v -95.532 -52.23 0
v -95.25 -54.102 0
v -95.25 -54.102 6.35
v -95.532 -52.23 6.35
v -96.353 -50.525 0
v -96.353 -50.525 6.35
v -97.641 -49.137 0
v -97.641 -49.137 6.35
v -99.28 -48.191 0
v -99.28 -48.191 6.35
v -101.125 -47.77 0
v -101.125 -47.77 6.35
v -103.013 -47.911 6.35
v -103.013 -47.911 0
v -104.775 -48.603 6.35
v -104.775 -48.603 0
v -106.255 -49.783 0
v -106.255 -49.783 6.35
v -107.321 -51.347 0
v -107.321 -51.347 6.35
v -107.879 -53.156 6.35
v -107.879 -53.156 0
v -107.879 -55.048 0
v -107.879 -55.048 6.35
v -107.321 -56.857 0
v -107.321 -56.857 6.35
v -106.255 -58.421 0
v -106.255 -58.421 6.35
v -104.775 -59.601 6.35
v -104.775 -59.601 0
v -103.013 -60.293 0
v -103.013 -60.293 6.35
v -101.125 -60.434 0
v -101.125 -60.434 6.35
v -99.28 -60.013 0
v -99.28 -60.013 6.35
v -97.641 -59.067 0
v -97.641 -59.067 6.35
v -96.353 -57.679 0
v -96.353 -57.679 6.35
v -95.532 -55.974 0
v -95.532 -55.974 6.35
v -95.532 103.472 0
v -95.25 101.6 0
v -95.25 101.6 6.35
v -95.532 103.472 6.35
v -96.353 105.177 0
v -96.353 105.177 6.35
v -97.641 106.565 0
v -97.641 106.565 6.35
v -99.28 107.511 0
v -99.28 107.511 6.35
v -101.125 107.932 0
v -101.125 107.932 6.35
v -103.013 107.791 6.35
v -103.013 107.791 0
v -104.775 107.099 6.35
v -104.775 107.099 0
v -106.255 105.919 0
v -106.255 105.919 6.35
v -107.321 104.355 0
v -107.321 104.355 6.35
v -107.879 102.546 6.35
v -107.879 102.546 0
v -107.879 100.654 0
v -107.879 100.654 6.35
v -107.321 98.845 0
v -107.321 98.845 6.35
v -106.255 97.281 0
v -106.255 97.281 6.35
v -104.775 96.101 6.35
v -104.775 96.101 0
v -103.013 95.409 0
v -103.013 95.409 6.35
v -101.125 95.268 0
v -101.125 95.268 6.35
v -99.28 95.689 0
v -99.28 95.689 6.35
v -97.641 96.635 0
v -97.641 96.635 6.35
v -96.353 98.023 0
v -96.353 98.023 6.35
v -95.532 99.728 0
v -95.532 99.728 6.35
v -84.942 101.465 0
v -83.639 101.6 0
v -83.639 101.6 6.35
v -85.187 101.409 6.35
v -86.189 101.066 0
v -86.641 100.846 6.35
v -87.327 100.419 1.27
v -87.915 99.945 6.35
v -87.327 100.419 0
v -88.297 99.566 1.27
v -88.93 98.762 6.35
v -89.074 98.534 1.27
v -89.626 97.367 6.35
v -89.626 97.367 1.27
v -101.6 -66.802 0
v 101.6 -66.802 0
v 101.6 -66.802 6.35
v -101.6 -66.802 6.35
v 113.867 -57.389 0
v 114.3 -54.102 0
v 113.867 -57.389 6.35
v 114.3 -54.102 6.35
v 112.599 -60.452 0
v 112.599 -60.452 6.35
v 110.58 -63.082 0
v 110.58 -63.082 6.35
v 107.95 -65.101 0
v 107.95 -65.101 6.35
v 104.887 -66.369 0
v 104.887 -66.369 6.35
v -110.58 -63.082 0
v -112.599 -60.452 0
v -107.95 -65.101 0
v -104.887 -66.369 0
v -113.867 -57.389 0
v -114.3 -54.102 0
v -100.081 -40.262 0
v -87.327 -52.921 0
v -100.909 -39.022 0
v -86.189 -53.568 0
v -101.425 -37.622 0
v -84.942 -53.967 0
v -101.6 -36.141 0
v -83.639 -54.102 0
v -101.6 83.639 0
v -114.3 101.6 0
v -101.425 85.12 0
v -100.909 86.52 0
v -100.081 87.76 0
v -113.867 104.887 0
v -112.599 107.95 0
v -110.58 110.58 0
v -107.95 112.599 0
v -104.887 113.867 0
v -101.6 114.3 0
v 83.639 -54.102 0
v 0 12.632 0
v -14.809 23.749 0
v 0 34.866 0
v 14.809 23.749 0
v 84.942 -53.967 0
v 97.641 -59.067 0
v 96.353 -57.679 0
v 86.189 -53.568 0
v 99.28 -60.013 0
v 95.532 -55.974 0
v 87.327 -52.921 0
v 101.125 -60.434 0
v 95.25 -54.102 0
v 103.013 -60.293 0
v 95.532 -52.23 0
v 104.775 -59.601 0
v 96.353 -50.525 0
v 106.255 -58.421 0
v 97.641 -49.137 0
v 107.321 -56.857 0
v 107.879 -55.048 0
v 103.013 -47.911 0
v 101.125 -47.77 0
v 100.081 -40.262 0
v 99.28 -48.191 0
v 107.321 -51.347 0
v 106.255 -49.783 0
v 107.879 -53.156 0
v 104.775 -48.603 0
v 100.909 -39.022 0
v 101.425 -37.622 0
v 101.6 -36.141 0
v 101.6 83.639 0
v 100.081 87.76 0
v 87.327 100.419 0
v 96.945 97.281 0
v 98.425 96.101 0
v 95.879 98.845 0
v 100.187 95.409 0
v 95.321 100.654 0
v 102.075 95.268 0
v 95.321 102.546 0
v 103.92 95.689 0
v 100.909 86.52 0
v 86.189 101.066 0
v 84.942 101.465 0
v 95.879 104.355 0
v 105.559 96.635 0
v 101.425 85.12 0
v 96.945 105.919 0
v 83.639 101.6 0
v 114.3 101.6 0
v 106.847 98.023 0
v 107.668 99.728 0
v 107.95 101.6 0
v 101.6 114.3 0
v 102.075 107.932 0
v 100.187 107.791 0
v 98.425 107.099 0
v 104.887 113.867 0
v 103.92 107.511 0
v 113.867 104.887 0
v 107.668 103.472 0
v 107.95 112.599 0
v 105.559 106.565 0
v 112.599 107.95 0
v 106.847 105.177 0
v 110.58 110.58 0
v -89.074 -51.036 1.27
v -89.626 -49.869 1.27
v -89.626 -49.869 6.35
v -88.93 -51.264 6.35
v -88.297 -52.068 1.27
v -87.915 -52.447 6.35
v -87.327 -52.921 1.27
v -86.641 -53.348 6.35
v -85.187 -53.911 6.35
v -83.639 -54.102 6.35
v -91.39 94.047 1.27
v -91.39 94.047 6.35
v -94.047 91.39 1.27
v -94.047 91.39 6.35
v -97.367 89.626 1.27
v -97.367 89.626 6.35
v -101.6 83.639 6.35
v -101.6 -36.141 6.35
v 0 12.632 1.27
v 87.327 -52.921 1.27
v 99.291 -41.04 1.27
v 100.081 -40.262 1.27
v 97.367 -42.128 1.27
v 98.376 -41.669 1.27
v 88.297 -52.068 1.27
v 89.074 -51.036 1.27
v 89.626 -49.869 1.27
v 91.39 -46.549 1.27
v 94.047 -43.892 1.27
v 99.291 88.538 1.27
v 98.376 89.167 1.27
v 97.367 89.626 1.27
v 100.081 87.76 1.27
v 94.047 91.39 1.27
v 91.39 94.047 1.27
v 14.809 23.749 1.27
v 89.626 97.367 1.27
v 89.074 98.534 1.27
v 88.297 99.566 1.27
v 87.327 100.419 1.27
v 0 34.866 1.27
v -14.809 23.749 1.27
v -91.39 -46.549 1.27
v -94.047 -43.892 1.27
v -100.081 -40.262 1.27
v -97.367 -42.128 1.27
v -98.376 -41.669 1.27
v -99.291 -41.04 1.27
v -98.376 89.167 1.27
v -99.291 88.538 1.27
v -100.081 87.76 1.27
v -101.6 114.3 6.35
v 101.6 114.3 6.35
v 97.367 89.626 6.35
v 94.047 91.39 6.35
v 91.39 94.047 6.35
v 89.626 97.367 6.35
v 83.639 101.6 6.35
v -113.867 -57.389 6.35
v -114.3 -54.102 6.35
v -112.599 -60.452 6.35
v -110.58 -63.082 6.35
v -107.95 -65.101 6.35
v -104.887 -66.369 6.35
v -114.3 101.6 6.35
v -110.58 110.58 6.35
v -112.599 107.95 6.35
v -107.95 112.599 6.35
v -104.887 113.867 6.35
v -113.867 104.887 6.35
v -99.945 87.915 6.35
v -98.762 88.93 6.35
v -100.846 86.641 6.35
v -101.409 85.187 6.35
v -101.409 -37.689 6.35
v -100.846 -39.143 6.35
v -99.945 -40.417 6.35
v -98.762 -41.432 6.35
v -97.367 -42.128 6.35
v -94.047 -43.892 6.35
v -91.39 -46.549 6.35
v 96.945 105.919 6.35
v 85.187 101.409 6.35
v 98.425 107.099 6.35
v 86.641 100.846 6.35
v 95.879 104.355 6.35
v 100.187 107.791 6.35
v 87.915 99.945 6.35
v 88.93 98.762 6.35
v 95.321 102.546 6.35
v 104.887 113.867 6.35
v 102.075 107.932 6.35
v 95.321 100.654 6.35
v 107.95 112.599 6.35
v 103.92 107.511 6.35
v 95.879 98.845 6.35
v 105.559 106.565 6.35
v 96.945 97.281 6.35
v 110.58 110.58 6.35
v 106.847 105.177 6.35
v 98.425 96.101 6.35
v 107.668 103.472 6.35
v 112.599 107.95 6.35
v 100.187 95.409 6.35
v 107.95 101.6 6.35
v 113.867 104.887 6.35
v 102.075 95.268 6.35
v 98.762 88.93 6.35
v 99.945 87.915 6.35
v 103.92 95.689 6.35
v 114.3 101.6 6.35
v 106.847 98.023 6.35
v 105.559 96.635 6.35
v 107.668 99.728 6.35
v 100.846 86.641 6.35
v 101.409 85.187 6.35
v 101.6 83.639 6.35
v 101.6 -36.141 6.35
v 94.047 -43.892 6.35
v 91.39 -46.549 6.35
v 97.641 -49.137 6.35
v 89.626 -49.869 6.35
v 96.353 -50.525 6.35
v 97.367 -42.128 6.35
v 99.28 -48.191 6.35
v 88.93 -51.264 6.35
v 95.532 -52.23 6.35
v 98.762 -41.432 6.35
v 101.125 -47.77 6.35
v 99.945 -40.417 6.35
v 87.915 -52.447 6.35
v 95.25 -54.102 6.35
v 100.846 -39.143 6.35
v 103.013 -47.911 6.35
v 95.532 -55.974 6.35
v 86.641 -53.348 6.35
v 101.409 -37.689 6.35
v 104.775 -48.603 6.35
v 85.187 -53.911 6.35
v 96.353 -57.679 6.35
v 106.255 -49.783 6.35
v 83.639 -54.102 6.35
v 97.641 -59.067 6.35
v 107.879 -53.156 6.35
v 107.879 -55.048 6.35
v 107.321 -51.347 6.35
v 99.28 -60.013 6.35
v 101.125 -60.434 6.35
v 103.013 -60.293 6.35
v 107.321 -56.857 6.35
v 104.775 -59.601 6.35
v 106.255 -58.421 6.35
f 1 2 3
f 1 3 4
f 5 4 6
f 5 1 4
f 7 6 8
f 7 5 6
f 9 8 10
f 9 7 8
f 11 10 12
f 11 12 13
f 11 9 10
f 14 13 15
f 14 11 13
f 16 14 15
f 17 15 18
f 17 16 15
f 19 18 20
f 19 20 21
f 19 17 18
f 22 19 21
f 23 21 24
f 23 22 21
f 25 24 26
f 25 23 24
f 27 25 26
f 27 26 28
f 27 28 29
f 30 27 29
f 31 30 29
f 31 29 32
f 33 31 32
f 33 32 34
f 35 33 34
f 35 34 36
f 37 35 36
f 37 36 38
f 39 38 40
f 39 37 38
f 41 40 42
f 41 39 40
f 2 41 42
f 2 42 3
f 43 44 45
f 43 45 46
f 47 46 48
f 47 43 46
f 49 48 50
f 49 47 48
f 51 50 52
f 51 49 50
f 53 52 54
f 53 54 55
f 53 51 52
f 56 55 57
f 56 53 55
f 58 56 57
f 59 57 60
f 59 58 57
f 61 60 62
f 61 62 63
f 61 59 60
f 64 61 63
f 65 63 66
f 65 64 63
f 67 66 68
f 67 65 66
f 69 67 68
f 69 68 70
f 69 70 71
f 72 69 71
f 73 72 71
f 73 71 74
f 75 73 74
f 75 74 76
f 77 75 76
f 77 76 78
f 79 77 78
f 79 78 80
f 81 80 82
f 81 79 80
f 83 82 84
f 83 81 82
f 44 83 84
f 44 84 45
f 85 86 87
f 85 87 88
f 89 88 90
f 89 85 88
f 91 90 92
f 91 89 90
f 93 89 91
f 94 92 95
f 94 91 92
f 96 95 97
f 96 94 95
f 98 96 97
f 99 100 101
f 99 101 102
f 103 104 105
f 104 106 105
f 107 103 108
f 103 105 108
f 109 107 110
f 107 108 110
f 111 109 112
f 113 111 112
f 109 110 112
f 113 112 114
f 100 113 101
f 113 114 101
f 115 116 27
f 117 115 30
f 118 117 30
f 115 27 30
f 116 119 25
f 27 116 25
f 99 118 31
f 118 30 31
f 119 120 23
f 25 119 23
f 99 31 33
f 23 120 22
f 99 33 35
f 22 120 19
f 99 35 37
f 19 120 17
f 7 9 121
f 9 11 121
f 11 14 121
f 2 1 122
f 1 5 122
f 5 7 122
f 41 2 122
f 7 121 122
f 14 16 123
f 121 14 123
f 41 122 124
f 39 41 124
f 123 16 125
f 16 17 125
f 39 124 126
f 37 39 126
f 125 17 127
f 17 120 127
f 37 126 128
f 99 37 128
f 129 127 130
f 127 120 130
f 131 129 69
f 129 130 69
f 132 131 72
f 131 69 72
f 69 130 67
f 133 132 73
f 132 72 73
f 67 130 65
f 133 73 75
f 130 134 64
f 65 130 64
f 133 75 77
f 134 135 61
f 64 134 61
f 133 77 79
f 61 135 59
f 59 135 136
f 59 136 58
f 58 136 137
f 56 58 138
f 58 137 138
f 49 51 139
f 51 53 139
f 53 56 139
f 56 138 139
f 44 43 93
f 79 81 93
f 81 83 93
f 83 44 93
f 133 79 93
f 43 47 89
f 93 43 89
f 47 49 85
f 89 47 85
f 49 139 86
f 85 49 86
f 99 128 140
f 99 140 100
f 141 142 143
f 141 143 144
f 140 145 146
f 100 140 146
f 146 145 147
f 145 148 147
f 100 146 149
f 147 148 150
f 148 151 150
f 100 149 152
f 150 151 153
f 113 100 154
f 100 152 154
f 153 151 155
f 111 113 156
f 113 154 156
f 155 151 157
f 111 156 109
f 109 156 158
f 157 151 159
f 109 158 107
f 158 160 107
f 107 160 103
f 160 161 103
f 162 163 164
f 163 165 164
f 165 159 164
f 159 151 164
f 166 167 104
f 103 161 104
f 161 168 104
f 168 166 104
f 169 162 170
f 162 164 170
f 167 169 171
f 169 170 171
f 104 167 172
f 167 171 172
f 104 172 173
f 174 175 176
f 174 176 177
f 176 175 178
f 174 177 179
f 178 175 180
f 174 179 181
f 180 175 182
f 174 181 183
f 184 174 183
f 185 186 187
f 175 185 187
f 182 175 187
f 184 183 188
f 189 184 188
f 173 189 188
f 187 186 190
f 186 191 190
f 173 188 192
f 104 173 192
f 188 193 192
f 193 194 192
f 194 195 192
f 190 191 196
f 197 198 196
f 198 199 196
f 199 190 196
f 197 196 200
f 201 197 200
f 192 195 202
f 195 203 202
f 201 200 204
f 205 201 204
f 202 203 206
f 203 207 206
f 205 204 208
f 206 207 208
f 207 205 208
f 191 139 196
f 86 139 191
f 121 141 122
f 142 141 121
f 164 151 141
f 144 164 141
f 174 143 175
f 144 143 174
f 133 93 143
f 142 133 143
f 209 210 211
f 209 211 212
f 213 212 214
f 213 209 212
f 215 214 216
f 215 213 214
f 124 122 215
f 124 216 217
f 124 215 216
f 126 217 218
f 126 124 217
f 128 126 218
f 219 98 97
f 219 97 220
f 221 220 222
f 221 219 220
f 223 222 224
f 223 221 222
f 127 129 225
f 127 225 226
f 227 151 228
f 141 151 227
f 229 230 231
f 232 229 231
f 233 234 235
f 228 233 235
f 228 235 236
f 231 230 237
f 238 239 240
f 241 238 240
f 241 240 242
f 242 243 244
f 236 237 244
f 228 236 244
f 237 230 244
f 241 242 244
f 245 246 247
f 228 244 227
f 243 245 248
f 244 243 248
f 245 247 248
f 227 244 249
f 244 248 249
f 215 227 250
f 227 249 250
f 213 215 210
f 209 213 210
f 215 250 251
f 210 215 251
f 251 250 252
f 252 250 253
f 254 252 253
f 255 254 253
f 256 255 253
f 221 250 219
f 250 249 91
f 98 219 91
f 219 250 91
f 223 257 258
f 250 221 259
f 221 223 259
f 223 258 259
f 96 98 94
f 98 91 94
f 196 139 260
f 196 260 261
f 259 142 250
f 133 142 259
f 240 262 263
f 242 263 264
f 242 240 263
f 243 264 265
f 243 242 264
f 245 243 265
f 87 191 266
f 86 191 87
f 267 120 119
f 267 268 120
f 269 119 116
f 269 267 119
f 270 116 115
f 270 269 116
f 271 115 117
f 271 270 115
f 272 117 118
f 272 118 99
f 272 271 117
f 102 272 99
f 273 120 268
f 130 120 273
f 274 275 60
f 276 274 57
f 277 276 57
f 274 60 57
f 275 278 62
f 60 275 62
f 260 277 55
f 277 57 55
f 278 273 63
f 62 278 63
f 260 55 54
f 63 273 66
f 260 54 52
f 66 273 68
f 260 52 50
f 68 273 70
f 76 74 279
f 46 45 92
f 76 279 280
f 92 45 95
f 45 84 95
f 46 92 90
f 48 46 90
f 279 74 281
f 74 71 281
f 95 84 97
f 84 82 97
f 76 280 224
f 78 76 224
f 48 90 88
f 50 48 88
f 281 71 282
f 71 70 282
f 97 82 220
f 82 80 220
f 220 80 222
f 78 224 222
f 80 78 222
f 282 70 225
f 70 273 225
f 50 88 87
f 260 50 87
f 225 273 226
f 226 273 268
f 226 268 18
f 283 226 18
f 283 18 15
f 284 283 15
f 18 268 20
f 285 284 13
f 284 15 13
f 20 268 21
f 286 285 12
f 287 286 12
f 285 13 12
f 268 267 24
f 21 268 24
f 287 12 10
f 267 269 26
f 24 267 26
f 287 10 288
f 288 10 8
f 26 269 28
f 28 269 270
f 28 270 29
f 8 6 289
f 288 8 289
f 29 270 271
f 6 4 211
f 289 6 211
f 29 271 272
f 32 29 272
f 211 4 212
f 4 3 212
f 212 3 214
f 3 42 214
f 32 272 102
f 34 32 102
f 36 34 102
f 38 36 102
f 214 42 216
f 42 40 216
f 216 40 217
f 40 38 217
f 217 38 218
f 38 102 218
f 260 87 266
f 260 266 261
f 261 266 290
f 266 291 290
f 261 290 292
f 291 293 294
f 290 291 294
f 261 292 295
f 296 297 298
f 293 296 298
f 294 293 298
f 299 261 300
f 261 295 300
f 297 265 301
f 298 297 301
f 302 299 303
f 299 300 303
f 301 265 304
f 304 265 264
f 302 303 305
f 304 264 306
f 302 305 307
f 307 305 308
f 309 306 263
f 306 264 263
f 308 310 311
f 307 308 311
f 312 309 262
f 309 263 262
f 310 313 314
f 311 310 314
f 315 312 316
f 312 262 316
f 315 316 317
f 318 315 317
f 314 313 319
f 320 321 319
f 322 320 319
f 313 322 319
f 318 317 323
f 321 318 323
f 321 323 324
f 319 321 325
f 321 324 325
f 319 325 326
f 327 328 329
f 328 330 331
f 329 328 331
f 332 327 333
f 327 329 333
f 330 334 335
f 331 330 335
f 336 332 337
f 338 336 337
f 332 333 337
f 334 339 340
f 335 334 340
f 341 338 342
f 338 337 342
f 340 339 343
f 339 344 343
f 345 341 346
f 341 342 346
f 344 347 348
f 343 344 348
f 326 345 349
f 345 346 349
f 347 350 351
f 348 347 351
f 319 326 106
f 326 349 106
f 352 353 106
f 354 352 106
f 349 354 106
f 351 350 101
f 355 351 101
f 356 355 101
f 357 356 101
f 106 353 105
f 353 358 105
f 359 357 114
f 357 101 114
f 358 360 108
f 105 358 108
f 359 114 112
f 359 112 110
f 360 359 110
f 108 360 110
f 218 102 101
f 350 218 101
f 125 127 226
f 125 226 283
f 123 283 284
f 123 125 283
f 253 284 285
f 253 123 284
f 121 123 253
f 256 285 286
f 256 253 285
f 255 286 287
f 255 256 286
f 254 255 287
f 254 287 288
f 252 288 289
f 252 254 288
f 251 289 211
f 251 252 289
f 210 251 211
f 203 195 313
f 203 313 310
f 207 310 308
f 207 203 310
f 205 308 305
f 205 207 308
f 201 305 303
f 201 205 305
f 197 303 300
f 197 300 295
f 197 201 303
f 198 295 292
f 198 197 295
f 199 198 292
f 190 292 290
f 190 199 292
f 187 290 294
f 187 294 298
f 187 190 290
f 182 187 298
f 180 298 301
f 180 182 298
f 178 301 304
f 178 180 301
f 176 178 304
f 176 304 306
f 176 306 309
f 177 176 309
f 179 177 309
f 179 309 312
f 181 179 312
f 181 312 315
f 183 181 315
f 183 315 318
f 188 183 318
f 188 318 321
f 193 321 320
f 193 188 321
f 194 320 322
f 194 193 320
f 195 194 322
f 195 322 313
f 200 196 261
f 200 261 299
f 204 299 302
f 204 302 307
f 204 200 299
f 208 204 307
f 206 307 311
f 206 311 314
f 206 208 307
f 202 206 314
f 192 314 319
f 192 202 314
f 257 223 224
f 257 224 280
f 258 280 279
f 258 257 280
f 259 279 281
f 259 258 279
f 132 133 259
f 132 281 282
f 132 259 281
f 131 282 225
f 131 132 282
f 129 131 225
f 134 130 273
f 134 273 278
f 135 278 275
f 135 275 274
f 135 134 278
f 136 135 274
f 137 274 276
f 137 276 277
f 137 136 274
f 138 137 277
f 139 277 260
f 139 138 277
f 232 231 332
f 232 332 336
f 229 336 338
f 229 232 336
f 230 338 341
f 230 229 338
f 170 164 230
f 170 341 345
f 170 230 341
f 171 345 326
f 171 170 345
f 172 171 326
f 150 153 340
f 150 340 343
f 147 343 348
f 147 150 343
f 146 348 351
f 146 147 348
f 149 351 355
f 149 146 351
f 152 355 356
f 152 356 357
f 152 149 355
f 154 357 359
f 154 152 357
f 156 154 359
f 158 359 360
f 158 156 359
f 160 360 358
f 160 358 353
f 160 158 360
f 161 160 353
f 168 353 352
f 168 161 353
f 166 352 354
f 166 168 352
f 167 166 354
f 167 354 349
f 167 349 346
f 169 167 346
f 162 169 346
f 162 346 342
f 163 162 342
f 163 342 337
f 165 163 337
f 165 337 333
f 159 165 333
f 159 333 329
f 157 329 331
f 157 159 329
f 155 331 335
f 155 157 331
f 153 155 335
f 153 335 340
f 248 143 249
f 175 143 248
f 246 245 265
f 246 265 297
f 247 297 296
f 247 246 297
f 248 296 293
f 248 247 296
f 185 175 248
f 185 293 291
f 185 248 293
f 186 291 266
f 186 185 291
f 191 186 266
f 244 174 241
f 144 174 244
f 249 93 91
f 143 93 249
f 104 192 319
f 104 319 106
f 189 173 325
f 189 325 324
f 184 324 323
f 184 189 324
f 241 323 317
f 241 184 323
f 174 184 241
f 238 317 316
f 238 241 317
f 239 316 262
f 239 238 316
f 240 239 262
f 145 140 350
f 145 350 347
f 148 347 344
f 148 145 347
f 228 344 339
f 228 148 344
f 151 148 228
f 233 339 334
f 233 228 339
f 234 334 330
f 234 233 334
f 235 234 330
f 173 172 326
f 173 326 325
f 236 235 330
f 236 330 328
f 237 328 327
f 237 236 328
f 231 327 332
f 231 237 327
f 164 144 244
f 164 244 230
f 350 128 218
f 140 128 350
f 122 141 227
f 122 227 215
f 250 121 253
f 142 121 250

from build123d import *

# Parameters (mm, degrees)
SKETCH1_R           = 6.35
OUTLINE_DEPTH       = 6.35
FILLET2_R           = 12.7
BOSS_EXTRUDE1_DEPTH = 1.27
FILLET1_R           = 6.35


with BuildPart() as part:
    # Sketch1 → Outline (new body)
    with BuildSketch(Plane.XY):
        with BuildLine():
            Line((-101.6, 114.3), (101.6, 114.3))
            ThreePointArc((101.6, 114.3), (110.580256121, 110.580256121), (114.3, 101.6))
            Line((114.3, 101.6), (114.3, -66.802))
            Line((114.3, -66.802), (-114.3, -66.802))
            Line((-114.3, -66.802), (-114.3, 101.6))
            ThreePointArc((-114.3, 101.6), (-110.580256121, 110.580256121), (-101.6, 114.3))
        make_face()
        with Locations((-101.6, 101.6)):
            Circle(SKETCH1_R, mode=Mode.SUBTRACT)
        with Locations((101.6, 101.6)):
            Circle(SKETCH1_R, mode=Mode.SUBTRACT)
        with Locations((-101.6, -54.102)):
            Circle(SKETCH1_R, mode=Mode.SUBTRACT)
        with Locations(Location((101.6, -54.102, 0), (0, 0, 180))):
            Circle(SKETCH1_R, mode=Mode.SUBTRACT)
        with BuildLine():
            Line((-101.6, 88.9), (-101.6, -41.402))
            ThreePointArc((-101.6, -41.402), (-92.619743879, -45.121743879), (-88.9, -54.102))
            Line((-88.9, -54.102), (88.9, -54.102))
            ThreePointArc((88.9, -54.102), (92.619743879, -45.121743879), (101.6, -41.402))
            Line((101.6, -41.402), (101.6, 88.9))
            ThreePointArc((101.6, 88.9), (92.619743879, 92.619743879), (88.9, 101.6))
            Line((88.9, 101.6), (-88.9, 101.6))
            ThreePointArc((-88.9, 101.6), (-92.619743879, 92.619743879), (-101.6, 88.9))
        make_face(mode=Mode.SUBTRACT)
    extrude(amount=OUTLINE_DEPTH)

    # Fillet2
    fillet2_edges = [part.edges().sort_by_distance(p)[0] for p in [
        (114.3, -66.802, 3.175),
        (-114.3, -66.802, 3.175),
    ]]
    fillet(fillet2_edges, radius=FILLET2_R)

    # Sketch2 → Boss-Extrude1 (add)
    with BuildSketch(Plane(origin=(0, 0, 0), x_dir=(-1, 0, 0), z_dir=(0, 0, -1))):
        with BuildLine():
            Line((-101.6, 88.9), (-14.809147425, 23.749))
            Line((-14.809147425, 23.749), (-101.6, -41.402))
            ThreePointArc((-101.6, -41.402), (-92.619743879, -45.121743879), (-88.9, -54.102))
            Line((-88.9, -54.102), (0, 12.632266667))
            Line((0, 12.632266667), (88.9, -54.102))
            ThreePointArc((88.9, -54.102), (92.619743879, -45.121743879), (101.6, -41.402))
            Line((101.6, -41.402), (14.809147425, 23.749))
            Line((14.809147425, 23.749), (101.6, 88.9))
            ThreePointArc((101.6, 88.9), (92.619743879, 92.619743879), (88.9, 101.6))
            Line((88.9, 101.6), (0, 34.865733333))
            Line((0, 34.865733333), (-88.9, 101.6))
            ThreePointArc((-88.9, 101.6), (-92.619743879, 92.619743879), (-101.6, 88.9))
        make_face()
    extrude(amount=-BOSS_EXTRUDE1_DEPTH)

    # Fillet1
    # the kernel refuses this fillet: 6.35 mm, written as the material it adds along each edge
    with BuildSketch(Plane(origin=(101.6, 88.9, -11.881280605), x_dir=(0, -1, 0), z_dir=(0, 0, 1))) as fillet1_piece_1_section:
        with BuildLine():
            CenterArc((5.260512242, -6.35), FILLET1_R, 90, 70.528779366)
            ThreePointArc((-0.726325172, -4.233333333), (-0.182898292, -2.14759513), (0, 0))
            Line((0, 0), (5.260512242, 0))
        make_face()
    fillet1_piece_1 = extrude(amount=18.231280605, mode=Mode.PRIVATE)
    fillet1_piece_1 = split(fillet1_piece_1, bisect_by=Plane(origin=(101.237498755, 87.006858293, 0), z_dir=(0, 0, 1)), keep=Keep.TOP, mode=Mode.PRIVATE)
    add(fillet1_piece_1)
    with BuildSketch(Plane(origin=(88.9, 101.6, -11.881280605), x_dir=(-1, 0, 0), z_dir=(0, 0, 1))) as fillet1_piece_2_section:
        with BuildLine():
            CenterArc((5.260512242, 6.35), FILLET1_R, 199.471220634, 70.528779366)
            ThreePointArc((-0.726325172, 4.233333333), (-0.182898292, 2.14759513), (0, 0))
            Line((0, 0), (5.260512242, 0))
        make_face()
    fillet1_piece_2 = extrude(amount=18.231280605, mode=Mode.PRIVATE)
    fillet1_piece_2 = split(fillet1_piece_2, bisect_by=Plane(origin=(86.835808608, 101.33047194, 0), z_dir=(0, 0, 1)), keep=Keep.TOP, mode=Mode.PRIVATE)
    add(fillet1_piece_2)
    with BuildSketch(Plane(origin=(-101.6, 88.9, -11.881280605), x_dir=(0, -1, 0), z_dir=(0, 0, 1))) as fillet1_piece_3_section:
        with BuildLine():
            CenterArc((5.260512242, 6.35), FILLET1_R, 199.471220634, 70.528779366)
            ThreePointArc((-0.726325172, 4.233333333), (-0.182898292, 2.14759513), (0, 0))
            Line((0, 0), (5.260512242, 0))
        make_face()
    fillet1_piece_3 = extrude(amount=18.231280605, mode=Mode.PRIVATE)
    fillet1_piece_3 = split(fillet1_piece_3, bisect_by=Plane(origin=(-101.237498755, 87.006858293, 0), z_dir=(0, 0, 1)), keep=Keep.TOP, mode=Mode.PRIVATE)
    add(fillet1_piece_3)
    with BuildSketch(Plane(origin=(-88.9, 101.6, -11.881280605), x_dir=(1, 0, 0), z_dir=(0, 0, 1))) as fillet1_piece_4_section:
        with BuildLine():
            CenterArc((5.260512242, -6.35), FILLET1_R, 90, 70.528779366)
            ThreePointArc((-0.726325172, -4.233333333), (-0.182898292, -2.14759513), (0, 0))
            Line((0, 0), (5.260512242, 0))
        make_face()
    fillet1_piece_4 = extrude(amount=18.231280605, mode=Mode.PRIVATE)
    fillet1_piece_4 = split(fillet1_piece_4, bisect_by=Plane(origin=(-86.835808608, 101.33047194, 0), z_dir=(0, 0, 1)), keep=Keep.TOP, mode=Mode.PRIVATE)
    add(fillet1_piece_4)
    with BuildSketch(Plane(origin=(-101.6, -41.402, -11.881280605), x_dir=(0, 1, 0), z_dir=(0, 0, 1))) as fillet1_piece_5_section:
        with BuildLine():
            CenterArc((5.260512242, -6.35), FILLET1_R, 90, 70.528779366)
            ThreePointArc((-0.726325172, -4.233333333), (-0.182898292, -2.14759513), (0, 0))
            Line((0, 0), (5.260512242, 0))
        make_face()
    fillet1_piece_5 = extrude(amount=18.231280605, mode=Mode.PRIVATE)
    fillet1_piece_5 = split(fillet1_piece_5, bisect_by=Plane(origin=(-101.237498755, -39.508858293, 0), z_dir=(0, 0, 1)), keep=Keep.TOP, mode=Mode.PRIVATE)
    add(fillet1_piece_5)
    with BuildSketch(Plane(origin=(101.6, -41.402, -11.881280605), x_dir=(0, 1, 0), z_dir=(0, 0, 1))) as fillet1_piece_6_section:
        with BuildLine():
            CenterArc((5.260512242, 6.35), FILLET1_R, 199.471220634, 70.528779366)
            ThreePointArc((-0.726325172, 4.233333333), (-0.182898292, 2.14759513), (0, 0))
            Line((0, 0), (5.260512242, 0))
        make_face()
    fillet1_piece_6 = extrude(amount=18.231280605, mode=Mode.PRIVATE)
    fillet1_piece_6 = split(fillet1_piece_6, bisect_by=Plane(origin=(101.237498755, -39.508858293, 0), z_dir=(0, 0, 1)), keep=Keep.TOP, mode=Mode.PRIVATE)
    add(fillet1_piece_6)
    with BuildSketch(Plane(origin=(-88.9, -54.102, -11.881280605), x_dir=(1, 0, 0), z_dir=(0, 0, 1))) as fillet1_piece_7_section:
        with BuildLine():
            CenterArc((5.260512242, 6.35), FILLET1_R, 199.471220634, 70.528779366)
            ThreePointArc((-0.726325172, 4.233333333), (-0.182898292, 2.14759513), (0, 0))
            Line((0, 0), (5.260512242, 0))
        make_face()
    fillet1_piece_7 = extrude(amount=18.231280605, mode=Mode.PRIVATE)
    fillet1_piece_7 = split(fillet1_piece_7, bisect_by=Plane(origin=(-86.835808608, -53.83247194, 0), z_dir=(0, 0, 1)), keep=Keep.TOP, mode=Mode.PRIVATE)
    add(fillet1_piece_7)
    with BuildSketch(Plane(origin=(88.9, -54.102, -11.881280605), x_dir=(-1, 0, 0), z_dir=(0, 0, 1))) as fillet1_piece_8_section:
        with BuildLine():
            CenterArc((5.260512242, -6.35), FILLET1_R, 90, 70.528779366)
            ThreePointArc((-0.726325172, -4.233333333), (-0.182898292, -2.14759513), (0, 0))
            Line((0, 0), (5.260512242, 0))
        make_face()
    fillet1_piece_8 = extrude(amount=18.231280605, mode=Mode.PRIVATE)
    fillet1_piece_8 = split(fillet1_piece_8, bisect_by=Plane(origin=(86.835808608, -53.83247194, 0), z_dir=(0, 0, 1)), keep=Keep.TOP, mode=Mode.PRIVATE)
    add(fillet1_piece_8)


solid = part.part
